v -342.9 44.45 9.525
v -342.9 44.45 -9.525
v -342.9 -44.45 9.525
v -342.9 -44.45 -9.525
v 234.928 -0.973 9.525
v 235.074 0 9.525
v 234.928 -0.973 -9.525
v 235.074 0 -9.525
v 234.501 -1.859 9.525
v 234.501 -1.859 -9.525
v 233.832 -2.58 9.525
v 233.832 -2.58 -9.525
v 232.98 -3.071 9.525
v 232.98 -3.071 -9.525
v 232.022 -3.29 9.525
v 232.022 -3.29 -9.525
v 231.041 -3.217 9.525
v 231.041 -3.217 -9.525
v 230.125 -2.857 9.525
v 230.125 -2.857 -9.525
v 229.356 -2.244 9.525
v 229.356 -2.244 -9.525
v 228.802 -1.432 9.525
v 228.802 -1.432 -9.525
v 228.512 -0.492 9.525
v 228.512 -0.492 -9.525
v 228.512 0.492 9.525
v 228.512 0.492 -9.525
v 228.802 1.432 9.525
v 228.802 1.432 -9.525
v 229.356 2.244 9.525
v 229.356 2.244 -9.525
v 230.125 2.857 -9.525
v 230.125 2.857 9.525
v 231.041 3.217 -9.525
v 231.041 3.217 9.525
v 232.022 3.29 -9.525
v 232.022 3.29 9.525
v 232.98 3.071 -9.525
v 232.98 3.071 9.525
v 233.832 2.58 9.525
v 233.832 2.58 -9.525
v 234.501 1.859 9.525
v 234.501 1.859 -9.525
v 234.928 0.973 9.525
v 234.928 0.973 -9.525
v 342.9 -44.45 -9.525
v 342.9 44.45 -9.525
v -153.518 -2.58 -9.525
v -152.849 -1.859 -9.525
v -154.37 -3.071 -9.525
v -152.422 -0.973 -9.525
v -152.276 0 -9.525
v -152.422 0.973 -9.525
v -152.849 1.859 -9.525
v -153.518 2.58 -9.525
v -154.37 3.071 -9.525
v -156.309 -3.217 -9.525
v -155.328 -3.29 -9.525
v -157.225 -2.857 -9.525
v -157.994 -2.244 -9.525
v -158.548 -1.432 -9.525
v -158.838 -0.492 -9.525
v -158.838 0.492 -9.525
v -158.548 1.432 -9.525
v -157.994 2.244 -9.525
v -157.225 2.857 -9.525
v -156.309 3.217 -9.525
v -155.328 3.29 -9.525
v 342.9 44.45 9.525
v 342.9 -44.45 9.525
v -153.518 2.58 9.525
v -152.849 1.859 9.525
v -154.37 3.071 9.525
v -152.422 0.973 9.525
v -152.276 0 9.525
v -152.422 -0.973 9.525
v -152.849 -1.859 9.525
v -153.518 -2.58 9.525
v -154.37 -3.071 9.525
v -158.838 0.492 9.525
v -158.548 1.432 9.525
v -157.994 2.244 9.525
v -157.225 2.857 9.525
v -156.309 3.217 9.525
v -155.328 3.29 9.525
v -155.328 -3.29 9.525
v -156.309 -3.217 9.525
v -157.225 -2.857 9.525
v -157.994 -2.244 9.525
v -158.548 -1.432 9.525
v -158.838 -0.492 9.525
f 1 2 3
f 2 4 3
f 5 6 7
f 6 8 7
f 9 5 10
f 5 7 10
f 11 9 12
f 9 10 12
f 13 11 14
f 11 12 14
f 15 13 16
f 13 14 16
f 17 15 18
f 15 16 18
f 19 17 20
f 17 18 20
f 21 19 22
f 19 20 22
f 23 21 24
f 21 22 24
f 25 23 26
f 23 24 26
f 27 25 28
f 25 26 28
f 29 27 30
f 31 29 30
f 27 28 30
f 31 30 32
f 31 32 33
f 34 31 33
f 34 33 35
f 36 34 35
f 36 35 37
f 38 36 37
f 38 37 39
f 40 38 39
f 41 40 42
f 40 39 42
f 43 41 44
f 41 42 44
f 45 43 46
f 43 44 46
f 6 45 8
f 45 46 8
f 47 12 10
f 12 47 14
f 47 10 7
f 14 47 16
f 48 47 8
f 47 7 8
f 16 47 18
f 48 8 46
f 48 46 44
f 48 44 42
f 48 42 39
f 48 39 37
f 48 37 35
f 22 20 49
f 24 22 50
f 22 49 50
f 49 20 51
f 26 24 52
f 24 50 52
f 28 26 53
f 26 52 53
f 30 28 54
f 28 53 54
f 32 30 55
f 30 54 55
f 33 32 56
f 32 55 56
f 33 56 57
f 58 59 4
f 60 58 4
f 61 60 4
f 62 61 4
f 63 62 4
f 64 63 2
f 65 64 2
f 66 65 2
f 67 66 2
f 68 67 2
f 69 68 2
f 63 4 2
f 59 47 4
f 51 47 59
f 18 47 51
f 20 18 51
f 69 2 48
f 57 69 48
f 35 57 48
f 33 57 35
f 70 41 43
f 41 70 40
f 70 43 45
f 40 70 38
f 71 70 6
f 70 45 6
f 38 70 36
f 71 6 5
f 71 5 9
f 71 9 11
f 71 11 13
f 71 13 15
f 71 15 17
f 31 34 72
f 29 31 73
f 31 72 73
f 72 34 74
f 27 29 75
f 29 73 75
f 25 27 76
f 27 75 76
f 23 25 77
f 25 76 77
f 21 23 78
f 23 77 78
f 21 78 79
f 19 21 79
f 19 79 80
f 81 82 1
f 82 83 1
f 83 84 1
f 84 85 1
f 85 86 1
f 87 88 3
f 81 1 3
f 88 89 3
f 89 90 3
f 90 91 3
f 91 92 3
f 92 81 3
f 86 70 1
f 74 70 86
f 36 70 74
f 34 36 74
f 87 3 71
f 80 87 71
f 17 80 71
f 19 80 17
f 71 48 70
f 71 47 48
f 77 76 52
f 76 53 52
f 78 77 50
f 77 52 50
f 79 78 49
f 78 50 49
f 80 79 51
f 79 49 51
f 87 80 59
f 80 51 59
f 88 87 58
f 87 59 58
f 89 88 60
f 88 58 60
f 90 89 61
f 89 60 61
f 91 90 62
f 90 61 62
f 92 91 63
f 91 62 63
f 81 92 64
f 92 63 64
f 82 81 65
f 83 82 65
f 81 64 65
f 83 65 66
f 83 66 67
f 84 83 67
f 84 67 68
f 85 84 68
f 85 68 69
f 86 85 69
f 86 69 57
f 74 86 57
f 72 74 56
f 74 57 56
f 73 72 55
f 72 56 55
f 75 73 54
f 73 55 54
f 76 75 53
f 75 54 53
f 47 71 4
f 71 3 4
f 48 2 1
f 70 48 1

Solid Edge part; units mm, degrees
sketch "Sketch1" plane through (0, 0, 0) normal (1, 0, 0) x (0, 1, 0)
  line L0 (-44.45, -9.525) -> (44.45, -9.525)
  line L1 (44.45, -9.525) -> (44.45, 9.525)
  line L2 (44.45, 9.525) -> (-44.45, 9.525)
  line L3 (-44.45, 9.525) -> (-44.45, -9.525)
  dimension "D1" = 88.9
  dimension "D2" = 19.05
extrude "Protrusion1" add sketch "Sketch1" along normal mid plane 685.8
sketch "Sketch2" plane through (0, 0, -9.525) normal (0, 0, -1) x (1, 0, 0)
  circle A0 centre (231.775, 0) radius 3.2995
  circle A1 centre (-155.575, 0) radius 3.2995
  dimension "D1" = 6.5989
  dimension "D2" = 111.125
  dimension "D3" = 498.475
extrude "Cutout1" cut sketch "Sketch2" against normal through all
properties material "Wood, Pine"
